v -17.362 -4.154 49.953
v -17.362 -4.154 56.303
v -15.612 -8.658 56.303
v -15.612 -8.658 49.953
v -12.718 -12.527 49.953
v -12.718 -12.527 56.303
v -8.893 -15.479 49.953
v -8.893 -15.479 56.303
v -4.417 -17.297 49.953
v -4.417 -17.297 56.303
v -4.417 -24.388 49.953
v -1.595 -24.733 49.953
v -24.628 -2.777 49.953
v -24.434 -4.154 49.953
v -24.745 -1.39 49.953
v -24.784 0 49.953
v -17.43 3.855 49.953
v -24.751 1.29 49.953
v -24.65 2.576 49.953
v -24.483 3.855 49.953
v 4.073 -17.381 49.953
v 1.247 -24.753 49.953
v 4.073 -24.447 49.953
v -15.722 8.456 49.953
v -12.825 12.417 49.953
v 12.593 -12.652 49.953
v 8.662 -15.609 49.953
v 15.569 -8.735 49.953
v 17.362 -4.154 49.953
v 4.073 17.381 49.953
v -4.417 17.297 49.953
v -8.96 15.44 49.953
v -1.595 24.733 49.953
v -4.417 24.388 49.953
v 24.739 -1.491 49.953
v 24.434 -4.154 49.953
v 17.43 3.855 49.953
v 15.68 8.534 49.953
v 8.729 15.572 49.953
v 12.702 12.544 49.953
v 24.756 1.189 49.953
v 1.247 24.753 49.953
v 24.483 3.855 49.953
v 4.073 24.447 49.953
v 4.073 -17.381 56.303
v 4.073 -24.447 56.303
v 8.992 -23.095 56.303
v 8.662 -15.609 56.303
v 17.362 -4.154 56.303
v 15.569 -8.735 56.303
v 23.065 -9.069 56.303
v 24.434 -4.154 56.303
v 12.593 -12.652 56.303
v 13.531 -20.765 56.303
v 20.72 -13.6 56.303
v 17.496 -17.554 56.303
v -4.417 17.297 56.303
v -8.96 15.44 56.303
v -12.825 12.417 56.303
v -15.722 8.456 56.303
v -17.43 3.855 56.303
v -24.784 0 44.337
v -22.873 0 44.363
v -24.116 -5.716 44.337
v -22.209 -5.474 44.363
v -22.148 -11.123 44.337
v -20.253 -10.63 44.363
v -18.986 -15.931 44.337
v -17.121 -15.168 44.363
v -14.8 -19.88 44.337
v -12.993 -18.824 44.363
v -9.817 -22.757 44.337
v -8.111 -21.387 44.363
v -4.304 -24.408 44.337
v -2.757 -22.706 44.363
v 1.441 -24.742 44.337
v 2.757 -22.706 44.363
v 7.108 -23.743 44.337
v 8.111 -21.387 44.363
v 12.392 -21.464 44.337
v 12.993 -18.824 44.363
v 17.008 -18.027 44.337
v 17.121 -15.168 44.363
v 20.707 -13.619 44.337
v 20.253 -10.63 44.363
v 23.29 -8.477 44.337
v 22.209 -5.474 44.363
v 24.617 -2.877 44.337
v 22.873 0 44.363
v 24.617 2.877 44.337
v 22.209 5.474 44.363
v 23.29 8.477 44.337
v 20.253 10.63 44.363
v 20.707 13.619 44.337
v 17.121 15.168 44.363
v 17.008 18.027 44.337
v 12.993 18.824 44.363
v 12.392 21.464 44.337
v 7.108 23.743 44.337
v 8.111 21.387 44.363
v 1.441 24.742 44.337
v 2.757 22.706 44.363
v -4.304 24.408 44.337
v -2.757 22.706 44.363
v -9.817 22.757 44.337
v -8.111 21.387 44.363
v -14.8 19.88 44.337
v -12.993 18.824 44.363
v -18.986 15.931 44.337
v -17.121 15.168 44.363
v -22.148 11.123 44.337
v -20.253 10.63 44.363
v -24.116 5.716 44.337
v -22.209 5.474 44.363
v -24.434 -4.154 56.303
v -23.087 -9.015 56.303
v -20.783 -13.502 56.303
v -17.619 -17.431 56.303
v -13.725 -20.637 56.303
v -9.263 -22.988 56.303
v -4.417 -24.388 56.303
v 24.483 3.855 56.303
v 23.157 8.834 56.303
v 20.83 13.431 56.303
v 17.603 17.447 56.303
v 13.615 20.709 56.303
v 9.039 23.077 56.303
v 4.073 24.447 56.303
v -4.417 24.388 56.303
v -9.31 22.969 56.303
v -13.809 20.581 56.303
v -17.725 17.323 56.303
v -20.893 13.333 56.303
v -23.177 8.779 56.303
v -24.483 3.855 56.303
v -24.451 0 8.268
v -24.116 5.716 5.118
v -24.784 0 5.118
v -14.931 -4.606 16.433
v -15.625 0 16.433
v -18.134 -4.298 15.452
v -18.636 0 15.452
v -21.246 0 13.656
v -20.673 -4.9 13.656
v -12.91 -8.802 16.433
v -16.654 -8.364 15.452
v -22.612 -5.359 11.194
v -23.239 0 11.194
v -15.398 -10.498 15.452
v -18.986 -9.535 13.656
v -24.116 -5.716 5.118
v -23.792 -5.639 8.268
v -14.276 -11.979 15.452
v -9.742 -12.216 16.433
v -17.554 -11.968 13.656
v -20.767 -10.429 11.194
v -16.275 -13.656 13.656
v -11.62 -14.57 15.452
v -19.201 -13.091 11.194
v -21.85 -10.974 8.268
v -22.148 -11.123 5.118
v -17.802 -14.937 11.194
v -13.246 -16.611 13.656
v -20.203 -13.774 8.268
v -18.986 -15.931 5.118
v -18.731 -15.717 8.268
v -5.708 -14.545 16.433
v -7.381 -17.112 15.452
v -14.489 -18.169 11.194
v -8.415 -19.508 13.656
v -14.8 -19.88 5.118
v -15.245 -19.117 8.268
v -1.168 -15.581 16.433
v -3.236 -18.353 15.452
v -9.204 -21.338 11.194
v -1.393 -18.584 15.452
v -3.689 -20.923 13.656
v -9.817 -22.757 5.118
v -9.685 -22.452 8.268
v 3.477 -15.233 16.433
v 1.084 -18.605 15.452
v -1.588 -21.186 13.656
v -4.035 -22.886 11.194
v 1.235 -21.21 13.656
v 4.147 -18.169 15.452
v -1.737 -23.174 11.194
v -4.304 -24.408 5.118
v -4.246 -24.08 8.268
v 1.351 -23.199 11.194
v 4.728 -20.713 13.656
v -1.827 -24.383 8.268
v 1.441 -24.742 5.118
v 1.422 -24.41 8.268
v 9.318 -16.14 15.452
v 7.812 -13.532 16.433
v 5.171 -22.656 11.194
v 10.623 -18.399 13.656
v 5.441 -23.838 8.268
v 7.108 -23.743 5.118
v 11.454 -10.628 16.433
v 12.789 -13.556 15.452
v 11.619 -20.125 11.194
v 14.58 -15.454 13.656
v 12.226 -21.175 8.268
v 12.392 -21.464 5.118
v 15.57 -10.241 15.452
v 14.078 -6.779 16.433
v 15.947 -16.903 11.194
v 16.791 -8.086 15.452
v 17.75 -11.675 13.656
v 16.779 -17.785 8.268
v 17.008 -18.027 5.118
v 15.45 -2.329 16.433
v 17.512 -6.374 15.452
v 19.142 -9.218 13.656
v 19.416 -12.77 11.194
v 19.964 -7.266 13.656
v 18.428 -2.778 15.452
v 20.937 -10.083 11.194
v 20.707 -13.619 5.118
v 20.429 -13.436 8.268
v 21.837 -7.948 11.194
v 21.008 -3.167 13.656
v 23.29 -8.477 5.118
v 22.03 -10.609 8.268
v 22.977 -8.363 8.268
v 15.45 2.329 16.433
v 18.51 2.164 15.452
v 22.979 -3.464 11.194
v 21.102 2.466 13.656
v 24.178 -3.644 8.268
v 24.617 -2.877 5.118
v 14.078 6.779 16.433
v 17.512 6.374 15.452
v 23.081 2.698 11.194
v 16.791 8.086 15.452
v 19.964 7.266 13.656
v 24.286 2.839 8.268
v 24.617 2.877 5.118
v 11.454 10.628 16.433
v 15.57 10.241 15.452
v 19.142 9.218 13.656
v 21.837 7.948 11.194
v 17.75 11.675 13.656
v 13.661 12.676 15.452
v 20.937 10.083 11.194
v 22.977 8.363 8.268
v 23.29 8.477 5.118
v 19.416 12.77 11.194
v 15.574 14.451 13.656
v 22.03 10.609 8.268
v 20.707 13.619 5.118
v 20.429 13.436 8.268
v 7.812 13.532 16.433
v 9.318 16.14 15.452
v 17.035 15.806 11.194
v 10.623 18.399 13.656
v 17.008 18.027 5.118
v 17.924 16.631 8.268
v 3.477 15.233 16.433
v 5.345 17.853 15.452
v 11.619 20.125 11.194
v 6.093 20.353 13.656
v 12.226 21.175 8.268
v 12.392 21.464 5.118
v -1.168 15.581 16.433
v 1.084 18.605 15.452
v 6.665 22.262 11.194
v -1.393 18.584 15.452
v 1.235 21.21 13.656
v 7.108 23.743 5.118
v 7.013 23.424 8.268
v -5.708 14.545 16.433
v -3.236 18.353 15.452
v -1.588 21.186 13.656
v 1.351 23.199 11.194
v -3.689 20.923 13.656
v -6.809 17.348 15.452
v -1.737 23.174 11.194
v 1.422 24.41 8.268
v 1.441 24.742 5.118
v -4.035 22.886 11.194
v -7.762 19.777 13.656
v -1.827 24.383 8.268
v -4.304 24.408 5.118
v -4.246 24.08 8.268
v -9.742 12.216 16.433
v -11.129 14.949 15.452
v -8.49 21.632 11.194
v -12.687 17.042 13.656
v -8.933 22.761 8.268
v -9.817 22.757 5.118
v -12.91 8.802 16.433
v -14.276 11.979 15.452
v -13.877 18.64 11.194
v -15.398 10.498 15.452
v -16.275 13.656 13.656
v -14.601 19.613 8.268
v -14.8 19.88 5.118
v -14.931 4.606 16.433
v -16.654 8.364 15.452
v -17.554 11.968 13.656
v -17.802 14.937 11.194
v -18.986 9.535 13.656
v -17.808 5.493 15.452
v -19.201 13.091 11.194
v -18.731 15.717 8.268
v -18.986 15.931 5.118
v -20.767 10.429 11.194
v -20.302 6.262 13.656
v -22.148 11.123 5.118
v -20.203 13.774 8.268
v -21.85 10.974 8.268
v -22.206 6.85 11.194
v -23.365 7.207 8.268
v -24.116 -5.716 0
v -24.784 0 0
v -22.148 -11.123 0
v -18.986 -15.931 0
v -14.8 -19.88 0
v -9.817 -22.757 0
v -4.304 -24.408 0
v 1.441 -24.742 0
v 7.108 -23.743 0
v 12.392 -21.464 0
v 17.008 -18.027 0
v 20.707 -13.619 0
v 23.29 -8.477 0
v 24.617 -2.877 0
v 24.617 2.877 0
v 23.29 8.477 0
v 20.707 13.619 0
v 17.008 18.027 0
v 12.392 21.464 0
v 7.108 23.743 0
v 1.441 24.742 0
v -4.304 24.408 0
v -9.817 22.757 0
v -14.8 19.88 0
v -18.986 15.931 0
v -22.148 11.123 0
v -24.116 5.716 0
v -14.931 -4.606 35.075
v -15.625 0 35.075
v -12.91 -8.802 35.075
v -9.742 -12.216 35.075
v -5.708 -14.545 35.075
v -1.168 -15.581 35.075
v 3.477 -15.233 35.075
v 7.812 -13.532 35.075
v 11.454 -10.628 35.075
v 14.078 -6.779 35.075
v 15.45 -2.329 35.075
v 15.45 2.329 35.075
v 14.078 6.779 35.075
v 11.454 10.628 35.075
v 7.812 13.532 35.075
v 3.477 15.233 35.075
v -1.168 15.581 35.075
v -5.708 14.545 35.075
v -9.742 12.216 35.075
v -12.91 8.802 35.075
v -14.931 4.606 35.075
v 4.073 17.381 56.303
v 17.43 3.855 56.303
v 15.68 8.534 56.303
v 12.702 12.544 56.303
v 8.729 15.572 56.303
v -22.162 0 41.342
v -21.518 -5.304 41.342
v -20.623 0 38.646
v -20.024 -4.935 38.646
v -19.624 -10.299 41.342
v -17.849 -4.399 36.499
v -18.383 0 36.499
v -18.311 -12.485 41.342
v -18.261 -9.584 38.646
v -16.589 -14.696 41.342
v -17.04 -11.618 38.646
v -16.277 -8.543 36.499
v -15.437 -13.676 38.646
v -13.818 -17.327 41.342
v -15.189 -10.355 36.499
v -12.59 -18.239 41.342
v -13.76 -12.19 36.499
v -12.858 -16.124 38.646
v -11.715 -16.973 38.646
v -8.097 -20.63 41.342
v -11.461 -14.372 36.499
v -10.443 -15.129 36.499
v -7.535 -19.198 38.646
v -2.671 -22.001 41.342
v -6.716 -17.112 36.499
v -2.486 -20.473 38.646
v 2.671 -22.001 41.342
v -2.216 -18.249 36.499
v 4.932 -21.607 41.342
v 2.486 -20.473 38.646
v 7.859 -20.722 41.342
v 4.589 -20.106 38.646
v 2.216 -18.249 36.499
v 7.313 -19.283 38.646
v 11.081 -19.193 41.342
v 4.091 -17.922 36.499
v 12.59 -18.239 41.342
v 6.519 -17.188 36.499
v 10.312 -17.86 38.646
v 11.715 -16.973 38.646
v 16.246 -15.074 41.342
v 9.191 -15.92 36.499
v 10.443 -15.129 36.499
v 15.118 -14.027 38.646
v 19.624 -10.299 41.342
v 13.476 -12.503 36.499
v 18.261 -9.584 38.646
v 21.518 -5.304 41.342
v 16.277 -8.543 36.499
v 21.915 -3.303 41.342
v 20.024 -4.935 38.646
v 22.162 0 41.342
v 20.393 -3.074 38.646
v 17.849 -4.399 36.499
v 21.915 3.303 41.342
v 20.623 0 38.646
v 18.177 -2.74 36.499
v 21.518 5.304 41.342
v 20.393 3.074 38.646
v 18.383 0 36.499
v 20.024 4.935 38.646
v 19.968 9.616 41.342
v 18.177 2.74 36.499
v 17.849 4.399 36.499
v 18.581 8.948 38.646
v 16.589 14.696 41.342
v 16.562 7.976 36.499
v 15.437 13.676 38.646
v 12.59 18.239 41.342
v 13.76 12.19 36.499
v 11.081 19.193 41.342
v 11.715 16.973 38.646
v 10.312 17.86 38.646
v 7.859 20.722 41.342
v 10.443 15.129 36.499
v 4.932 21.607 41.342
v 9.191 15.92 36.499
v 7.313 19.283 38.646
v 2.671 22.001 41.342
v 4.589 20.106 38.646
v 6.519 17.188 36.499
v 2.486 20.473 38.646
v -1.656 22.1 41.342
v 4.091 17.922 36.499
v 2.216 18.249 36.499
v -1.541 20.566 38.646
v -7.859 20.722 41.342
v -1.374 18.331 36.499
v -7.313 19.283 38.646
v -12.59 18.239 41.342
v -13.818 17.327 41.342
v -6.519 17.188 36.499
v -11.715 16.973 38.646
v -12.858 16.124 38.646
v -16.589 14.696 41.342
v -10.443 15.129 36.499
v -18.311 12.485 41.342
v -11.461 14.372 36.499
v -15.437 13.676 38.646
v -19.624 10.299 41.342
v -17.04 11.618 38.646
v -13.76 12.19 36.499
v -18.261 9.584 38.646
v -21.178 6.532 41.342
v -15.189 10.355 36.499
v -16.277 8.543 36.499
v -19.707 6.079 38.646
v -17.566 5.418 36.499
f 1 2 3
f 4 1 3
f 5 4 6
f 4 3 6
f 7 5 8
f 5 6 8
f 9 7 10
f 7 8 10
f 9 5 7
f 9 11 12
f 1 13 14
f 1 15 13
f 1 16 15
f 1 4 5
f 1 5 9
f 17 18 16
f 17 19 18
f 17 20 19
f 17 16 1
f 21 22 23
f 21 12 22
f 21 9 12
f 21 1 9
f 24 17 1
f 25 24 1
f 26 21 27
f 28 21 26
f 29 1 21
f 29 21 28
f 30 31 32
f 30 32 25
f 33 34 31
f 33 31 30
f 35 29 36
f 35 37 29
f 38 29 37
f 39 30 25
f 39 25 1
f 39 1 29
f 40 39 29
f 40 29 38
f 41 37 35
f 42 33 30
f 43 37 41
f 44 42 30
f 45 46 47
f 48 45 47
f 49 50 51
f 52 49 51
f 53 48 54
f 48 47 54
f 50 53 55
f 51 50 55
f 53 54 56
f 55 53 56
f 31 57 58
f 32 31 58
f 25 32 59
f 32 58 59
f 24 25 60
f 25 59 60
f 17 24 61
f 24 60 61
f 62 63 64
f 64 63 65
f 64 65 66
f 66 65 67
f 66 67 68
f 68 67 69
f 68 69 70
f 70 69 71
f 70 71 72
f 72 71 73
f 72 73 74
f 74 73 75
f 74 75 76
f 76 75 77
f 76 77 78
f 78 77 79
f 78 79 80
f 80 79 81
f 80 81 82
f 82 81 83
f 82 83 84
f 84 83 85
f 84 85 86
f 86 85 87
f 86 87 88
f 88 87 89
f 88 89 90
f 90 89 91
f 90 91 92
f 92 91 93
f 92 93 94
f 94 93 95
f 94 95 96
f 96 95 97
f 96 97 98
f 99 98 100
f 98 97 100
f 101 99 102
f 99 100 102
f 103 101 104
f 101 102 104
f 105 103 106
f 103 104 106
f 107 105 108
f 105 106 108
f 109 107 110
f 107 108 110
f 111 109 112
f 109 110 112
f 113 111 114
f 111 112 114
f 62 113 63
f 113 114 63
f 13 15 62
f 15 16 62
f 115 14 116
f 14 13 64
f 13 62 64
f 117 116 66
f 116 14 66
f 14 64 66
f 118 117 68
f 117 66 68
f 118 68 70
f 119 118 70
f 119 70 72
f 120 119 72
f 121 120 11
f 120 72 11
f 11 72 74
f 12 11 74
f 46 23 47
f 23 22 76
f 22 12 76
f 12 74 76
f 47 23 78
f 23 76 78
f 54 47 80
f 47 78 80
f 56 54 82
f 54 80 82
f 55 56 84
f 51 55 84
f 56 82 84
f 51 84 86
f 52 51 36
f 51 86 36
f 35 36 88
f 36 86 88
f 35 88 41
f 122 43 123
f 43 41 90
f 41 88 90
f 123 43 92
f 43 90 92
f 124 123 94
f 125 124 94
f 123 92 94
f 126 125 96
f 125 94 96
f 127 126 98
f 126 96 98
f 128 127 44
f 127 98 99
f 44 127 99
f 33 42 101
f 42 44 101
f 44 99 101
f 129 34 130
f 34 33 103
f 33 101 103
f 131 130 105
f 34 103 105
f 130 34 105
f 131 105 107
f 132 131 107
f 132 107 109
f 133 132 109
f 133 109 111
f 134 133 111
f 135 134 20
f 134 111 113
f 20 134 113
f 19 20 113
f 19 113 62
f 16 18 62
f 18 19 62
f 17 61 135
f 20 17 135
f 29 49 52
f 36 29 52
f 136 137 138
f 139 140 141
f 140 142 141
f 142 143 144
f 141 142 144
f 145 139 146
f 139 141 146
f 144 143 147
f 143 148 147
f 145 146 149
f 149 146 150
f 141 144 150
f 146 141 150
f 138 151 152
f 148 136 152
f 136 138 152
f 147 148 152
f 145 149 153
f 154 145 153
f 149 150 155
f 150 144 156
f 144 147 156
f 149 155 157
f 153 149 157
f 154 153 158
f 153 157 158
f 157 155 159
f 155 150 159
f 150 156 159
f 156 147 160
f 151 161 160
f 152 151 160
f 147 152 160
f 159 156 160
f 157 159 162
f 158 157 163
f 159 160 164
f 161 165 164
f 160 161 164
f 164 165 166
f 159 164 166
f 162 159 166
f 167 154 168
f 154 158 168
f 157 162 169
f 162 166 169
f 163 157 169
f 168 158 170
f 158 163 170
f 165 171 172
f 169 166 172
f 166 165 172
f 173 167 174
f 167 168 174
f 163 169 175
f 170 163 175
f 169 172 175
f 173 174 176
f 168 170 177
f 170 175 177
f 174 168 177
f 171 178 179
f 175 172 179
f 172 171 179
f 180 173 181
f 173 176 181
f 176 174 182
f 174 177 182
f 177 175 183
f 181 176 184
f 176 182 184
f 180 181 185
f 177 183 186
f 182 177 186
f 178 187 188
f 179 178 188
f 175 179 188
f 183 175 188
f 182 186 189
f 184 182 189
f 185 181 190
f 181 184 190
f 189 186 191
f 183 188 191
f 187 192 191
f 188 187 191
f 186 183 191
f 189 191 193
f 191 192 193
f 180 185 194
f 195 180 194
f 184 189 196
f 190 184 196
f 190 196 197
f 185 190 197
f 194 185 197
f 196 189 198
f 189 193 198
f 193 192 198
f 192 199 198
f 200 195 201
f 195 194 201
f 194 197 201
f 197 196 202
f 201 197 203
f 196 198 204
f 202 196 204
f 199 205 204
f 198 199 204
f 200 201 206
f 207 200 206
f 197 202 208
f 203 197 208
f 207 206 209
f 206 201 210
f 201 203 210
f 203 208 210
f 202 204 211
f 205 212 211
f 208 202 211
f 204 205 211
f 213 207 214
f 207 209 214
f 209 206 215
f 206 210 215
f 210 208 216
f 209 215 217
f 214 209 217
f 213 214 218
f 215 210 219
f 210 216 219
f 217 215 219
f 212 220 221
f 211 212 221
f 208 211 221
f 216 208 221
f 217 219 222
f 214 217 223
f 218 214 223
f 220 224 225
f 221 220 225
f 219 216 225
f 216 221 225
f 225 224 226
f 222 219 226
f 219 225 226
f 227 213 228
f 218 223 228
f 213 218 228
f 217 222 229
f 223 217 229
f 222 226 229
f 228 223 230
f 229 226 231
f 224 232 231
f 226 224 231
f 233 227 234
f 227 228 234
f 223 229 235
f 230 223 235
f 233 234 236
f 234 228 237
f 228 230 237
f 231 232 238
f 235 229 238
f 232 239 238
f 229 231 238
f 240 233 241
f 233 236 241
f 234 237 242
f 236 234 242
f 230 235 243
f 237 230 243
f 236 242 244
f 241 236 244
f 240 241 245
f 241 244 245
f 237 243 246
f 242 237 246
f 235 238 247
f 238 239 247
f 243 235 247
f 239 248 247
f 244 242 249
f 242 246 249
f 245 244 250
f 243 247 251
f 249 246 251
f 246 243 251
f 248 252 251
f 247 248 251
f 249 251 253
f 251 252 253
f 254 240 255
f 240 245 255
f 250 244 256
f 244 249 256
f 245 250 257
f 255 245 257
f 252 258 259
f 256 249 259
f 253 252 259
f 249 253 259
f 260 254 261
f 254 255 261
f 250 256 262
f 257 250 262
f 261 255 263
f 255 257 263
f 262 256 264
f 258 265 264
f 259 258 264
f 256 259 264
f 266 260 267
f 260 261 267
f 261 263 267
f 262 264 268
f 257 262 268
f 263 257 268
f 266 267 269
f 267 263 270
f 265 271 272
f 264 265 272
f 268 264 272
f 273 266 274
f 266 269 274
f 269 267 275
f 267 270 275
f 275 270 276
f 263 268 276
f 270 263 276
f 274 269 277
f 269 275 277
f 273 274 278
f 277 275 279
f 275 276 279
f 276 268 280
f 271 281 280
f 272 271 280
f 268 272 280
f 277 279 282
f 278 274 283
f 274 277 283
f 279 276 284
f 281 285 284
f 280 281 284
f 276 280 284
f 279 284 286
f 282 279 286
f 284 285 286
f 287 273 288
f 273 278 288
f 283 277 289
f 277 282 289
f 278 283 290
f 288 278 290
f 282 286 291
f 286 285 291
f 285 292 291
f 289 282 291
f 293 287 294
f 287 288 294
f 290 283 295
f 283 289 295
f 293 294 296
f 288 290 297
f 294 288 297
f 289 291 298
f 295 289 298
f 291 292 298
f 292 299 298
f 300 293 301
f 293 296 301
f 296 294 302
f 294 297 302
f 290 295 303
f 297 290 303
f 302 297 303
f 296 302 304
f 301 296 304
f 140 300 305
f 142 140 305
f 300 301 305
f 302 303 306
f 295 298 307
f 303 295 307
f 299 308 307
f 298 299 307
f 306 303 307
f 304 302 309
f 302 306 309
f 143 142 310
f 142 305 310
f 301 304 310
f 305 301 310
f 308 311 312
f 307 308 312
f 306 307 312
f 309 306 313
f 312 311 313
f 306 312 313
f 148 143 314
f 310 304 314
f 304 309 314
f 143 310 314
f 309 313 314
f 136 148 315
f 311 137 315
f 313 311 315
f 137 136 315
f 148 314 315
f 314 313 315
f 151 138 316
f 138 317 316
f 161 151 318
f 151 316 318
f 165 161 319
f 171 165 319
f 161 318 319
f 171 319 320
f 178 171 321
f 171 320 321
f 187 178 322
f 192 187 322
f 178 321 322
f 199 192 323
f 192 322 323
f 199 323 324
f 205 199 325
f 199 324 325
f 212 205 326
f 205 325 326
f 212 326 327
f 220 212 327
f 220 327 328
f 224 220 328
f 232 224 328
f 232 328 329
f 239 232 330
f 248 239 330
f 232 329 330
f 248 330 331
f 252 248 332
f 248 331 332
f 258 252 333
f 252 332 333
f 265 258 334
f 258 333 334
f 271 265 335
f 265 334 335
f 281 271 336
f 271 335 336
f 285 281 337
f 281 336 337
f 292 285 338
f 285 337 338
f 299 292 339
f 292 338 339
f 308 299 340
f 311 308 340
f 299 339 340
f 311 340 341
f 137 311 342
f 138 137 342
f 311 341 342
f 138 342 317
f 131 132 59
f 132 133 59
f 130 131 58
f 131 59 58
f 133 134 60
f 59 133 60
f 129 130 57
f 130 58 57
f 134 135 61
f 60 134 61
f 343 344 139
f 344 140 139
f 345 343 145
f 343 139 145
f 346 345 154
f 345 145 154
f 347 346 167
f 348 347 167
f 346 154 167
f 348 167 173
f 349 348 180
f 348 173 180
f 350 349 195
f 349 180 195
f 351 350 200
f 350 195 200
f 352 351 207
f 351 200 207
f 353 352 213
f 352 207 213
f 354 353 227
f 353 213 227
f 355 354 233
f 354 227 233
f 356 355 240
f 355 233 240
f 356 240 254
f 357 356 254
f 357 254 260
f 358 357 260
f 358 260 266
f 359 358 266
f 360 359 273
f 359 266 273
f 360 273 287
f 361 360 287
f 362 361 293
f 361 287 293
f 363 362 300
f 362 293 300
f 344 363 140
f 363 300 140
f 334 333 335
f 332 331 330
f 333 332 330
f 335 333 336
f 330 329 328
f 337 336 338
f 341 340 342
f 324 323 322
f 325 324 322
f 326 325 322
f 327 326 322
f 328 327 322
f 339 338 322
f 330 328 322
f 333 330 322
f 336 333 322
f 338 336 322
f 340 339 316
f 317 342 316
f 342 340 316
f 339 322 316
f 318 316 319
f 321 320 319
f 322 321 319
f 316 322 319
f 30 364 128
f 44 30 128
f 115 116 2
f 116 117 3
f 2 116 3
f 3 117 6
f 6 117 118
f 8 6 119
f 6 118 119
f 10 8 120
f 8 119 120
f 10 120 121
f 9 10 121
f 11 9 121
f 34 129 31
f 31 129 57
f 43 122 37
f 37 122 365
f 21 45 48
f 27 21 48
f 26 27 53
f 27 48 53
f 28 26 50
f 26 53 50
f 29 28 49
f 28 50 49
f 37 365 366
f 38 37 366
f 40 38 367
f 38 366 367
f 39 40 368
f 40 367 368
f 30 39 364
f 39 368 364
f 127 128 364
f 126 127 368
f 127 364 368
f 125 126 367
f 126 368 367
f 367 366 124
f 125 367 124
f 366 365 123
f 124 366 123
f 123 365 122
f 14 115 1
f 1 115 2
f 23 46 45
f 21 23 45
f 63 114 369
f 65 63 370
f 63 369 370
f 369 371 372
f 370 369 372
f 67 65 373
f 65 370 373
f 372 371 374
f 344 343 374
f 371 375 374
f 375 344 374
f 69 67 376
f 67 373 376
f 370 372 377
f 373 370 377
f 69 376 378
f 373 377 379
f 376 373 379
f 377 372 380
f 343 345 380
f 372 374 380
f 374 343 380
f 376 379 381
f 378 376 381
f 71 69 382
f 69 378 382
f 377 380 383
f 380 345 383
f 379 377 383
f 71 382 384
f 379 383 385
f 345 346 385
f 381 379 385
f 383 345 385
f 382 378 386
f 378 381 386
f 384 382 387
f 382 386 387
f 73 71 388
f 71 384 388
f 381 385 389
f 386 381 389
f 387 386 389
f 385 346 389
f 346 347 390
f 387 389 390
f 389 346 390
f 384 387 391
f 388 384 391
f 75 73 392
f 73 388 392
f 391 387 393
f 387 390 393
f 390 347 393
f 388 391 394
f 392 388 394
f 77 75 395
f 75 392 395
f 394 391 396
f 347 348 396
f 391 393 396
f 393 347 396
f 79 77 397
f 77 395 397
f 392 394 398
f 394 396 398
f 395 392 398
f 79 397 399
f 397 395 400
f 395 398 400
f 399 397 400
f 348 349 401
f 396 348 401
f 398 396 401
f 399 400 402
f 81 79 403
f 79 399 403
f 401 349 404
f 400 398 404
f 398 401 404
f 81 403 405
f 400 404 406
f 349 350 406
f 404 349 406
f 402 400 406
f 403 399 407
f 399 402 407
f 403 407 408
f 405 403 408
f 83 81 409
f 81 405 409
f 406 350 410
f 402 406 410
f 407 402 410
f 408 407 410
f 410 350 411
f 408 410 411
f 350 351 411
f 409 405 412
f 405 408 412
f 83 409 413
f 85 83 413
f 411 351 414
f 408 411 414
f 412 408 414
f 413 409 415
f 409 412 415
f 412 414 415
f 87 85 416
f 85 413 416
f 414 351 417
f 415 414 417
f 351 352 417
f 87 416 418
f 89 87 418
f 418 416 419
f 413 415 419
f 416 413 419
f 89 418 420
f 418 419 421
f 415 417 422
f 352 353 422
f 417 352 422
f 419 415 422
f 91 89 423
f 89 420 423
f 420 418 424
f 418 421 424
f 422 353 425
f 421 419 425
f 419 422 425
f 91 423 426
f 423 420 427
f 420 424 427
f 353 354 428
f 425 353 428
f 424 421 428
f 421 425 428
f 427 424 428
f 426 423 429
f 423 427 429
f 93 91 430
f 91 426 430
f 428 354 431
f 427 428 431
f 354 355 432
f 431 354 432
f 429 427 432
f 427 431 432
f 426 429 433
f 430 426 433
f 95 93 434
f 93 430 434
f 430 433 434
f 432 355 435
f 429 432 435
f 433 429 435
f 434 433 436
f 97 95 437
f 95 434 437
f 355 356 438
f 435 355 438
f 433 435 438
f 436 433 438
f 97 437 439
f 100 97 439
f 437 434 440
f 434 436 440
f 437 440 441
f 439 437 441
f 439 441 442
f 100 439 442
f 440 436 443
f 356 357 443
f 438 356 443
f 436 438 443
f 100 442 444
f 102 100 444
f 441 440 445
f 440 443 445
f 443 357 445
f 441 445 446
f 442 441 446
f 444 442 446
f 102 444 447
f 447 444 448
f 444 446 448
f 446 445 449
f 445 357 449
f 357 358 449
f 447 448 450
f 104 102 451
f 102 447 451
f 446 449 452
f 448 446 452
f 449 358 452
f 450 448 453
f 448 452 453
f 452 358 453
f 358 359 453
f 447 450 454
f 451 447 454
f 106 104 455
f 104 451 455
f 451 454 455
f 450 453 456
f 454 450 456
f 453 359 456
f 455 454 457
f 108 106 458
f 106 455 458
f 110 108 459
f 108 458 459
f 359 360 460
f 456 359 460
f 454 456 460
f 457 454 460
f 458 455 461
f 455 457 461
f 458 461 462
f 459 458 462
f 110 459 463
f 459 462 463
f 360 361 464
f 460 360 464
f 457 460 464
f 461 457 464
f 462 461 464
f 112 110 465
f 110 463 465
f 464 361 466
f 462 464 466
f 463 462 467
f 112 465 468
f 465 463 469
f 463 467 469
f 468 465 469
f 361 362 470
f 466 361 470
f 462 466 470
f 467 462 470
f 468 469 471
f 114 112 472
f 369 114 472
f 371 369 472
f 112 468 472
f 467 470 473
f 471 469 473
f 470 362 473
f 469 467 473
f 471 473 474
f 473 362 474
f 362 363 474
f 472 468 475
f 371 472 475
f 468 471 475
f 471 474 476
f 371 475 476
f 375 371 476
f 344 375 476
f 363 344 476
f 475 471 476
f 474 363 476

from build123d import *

# Parameters (mm, degrees)
F2_W     = 8.4896776825
F2_H     = 8.0091296695
F3_DEPTH = 6.35


with BuildPart() as f1:
    # F0 (on Front) → F1 (revolve)
    with BuildSketch(Plane.XZ):
        with BuildLine():
            Line((-24.7842427343, 0), (0, 0))
            Line((0, 0), (0, 56.3033334911))
            Line((0, 56.3033334911), (-24.7842427343, 56.3033334911))
            Line((-24.7842427343, 56.3033334911), (-24.7842427343, 44.3374402821))
            Line((-24.7842427343, 44.3374402821), (-22.8732544929, 44.3628020585))
            ThreePointArc((-22.8732544929, 44.3628020585), (-20.6233794189, 38.6463349976), (-15.6248472631, 35.0749753416))
            Line((-15.6248472631, 35.0749753416), (-15.6248472631, 16.4330303669))
            ThreePointArc((-15.6248472631, 16.4330303669), (-22.330766473, 12.4969846373), (-24.7842427343, 5.1184846088))
            Line((-24.7842427343, 5.1184846088), (-24.7842427343, 0))
        make_face()
    revolve(axis=Axis((0, 0, 28.1516667455), (0, 0, 1)))

    # F2 (on face) → F3 (cut)
    with BuildSketch(Plane.XY.offset(56.3033334911)):
        with BuildLine():
            Line((4.0728570893, 25.9603485465), (-4.4168205932, 25.9603485465))
            Line((-4.4168205932, 25.9603485465), (-4.4168205932, 17.2965058223))
            ThreePointArc((-4.4168205932, 17.2965058223), (-0.1770607755, 17.8506601361), (4.0728570893, 17.3807149721))
            Line((4.0728570893, 17.3807149721), (4.0728570893, 25.9603485465))
        make_face()
        with BuildLine():
            ThreePointArc((4.0728570893, 17.3807149721), (-0.1770607755, 17.8506601361), (-4.4168205932, 17.2965058223))
            Line((-4.4168205932, 17.2965058223), (-4.4168205932, 3.8551511243))
            Line((-4.4168205932, 3.8551511243), (4.0728570893, 3.8551511243))
            Line((4.0728570893, 3.8551511243), (4.0728570893, 17.3807149721))
        make_face()
        with BuildLine():
            Line((-4.4168205932, 3.8551511243), (-4.4168205932, 17.2965058223))
            ThreePointArc((-4.4168205932, 17.2965058223), (-12.8254291429, 12.4171568852), (-17.4302962574, 3.8551511243))
            Line((-17.4302962574, 3.8551511243), (-4.4168205932, 3.8551511243))
        make_face()
        with BuildLine():
            ThreePointArc((17.4302962574, 3.8551511243), (12.7016384893, 12.5437553188), (4.0728570893, 17.3807149721))
            Line((4.0728570893, 17.3807149721), (4.0728570893, 3.8551511243))
            Line((4.0728570893, 3.8551511243), (17.4302962574, 3.8551511243))
        make_face()
        with BuildLine():
            Line((-4.4168205932, -4.1539785452), (-4.4168205932, 3.8551511243))
            Line((-4.4168205932, 3.8551511243), (-17.4302962574, 3.8551511243))
            ThreePointArc((-17.4302962574, 3.8551511243), (-17.8508798192, -0.153321532), (-17.3615056967, -4.1539785452))
            Line((-17.3615056967, -4.1539785452), (-4.4168205932, -4.1539785452))
        make_face()
        with BuildLine():
            ThreePointArc((-17.3615056967, -4.1539785452), (-17.8508798192, -0.153321532), (-17.4302962574, 3.8551511243))
            Line((-17.4302962574, 3.8551511243), (-28.2840281725, 3.8551511243))
            Line((-28.2840281725, 3.8551511243), (-28.2840281725, -4.1539785452))
            Line((-28.2840281725, -4.1539785452), (-17.3615056967, -4.1539785452))
        make_face()
        with BuildLine():
            Line((17.4302962574, 3.8551511243), (4.0728570893, 3.8551511243))
            Line((4.0728570893, 3.8551511243), (4.0728570893, -4.1539785452))
            Line((4.0728570893, -4.1539785452), (17.3615056967, -4.1539785452))
            ThreePointArc((17.3615056967, -4.1539785452), (17.7286068375, -2.0913912627), (17.8515382478, 0))
            ThreePointArc((17.8515382478, 0), (17.7459152782, 1.9390484139), (17.4302962574, 3.8551511243))
        make_face()
        with BuildLine():
            Line((30.1826205105, 3.8551511243), (17.4302962574, 3.8551511243))
            ThreePointArc((17.4302962574, 3.8551511243), (17.7459152782, 1.9390484139), (17.8515382478, 0))
            ThreePointArc((17.8515382478, 0), (17.7286068375, -2.0913912627), (17.3615056967, -4.1539785452))
            Line((17.3615056967, -4.1539785452), (30.1826205105, -4.1539785452))
            Line((30.1826205105, -4.1539785452), (30.1826205105, 3.8551511243))
        make_face()
        with BuildLine():
            Line((4.0728570893, -4.1539785452), (-4.4168205932, -4.1539785452))
            Line((-4.4168205932, -4.1539785452), (-4.4168205932, -17.2965058223))
            ThreePointArc((-4.4168205932, -17.2965058223), (-0.1770607755, -17.8506601361), (4.0728570893, -17.3807149721))
            Line((4.0728570893, -17.3807149721), (4.0728570893, -4.1539785452))
        make_face()
        with BuildLine():
            Line((-4.4168205932, -17.2965058223), (-4.4168205932, -4.1539785452))
            Line((-4.4168205932, -4.1539785452), (-17.3615056967, -4.1539785452))
            ThreePointArc((-17.3615056967, -4.1539785452), (-12.7183088422, -12.5268526777), (-4.4168205932, -17.2965058223))
        make_face()
        with BuildLine():
            Line((17.3615056967, -4.1539785452), (4.0728570893, -4.1539785452))
            Line((4.0728570893, -4.1539785452), (4.0728570893, -17.3807149721))
            ThreePointArc((4.0728570893, -17.3807149721), (12.5934354383, -12.6523832409), (17.3615056967, -4.1539785452))
        make_face()
        with BuildLine():
            ThreePointArc((4.0728570893, -17.3807149721), (-0.1770607755, -17.8506601361), (-4.4168205932, -17.2965058223))
            Line((-4.4168205932, -17.2965058223), (-4.4168205932, -27.8610046953))
            Line((-4.4168205932, -27.8610046953), (4.0728570893, -27.8610046953))
            Line((4.0728570893, -27.8610046953), (4.0728570893, -17.3807149721))
        make_face()
        with Locations((-0.1719817519, -0.1494137105)):
            Rectangle(F2_W, F2_H)
    extrude(amount=-F3_DEPTH, mode=Mode.SUBTRACT)


solid = f1.part
